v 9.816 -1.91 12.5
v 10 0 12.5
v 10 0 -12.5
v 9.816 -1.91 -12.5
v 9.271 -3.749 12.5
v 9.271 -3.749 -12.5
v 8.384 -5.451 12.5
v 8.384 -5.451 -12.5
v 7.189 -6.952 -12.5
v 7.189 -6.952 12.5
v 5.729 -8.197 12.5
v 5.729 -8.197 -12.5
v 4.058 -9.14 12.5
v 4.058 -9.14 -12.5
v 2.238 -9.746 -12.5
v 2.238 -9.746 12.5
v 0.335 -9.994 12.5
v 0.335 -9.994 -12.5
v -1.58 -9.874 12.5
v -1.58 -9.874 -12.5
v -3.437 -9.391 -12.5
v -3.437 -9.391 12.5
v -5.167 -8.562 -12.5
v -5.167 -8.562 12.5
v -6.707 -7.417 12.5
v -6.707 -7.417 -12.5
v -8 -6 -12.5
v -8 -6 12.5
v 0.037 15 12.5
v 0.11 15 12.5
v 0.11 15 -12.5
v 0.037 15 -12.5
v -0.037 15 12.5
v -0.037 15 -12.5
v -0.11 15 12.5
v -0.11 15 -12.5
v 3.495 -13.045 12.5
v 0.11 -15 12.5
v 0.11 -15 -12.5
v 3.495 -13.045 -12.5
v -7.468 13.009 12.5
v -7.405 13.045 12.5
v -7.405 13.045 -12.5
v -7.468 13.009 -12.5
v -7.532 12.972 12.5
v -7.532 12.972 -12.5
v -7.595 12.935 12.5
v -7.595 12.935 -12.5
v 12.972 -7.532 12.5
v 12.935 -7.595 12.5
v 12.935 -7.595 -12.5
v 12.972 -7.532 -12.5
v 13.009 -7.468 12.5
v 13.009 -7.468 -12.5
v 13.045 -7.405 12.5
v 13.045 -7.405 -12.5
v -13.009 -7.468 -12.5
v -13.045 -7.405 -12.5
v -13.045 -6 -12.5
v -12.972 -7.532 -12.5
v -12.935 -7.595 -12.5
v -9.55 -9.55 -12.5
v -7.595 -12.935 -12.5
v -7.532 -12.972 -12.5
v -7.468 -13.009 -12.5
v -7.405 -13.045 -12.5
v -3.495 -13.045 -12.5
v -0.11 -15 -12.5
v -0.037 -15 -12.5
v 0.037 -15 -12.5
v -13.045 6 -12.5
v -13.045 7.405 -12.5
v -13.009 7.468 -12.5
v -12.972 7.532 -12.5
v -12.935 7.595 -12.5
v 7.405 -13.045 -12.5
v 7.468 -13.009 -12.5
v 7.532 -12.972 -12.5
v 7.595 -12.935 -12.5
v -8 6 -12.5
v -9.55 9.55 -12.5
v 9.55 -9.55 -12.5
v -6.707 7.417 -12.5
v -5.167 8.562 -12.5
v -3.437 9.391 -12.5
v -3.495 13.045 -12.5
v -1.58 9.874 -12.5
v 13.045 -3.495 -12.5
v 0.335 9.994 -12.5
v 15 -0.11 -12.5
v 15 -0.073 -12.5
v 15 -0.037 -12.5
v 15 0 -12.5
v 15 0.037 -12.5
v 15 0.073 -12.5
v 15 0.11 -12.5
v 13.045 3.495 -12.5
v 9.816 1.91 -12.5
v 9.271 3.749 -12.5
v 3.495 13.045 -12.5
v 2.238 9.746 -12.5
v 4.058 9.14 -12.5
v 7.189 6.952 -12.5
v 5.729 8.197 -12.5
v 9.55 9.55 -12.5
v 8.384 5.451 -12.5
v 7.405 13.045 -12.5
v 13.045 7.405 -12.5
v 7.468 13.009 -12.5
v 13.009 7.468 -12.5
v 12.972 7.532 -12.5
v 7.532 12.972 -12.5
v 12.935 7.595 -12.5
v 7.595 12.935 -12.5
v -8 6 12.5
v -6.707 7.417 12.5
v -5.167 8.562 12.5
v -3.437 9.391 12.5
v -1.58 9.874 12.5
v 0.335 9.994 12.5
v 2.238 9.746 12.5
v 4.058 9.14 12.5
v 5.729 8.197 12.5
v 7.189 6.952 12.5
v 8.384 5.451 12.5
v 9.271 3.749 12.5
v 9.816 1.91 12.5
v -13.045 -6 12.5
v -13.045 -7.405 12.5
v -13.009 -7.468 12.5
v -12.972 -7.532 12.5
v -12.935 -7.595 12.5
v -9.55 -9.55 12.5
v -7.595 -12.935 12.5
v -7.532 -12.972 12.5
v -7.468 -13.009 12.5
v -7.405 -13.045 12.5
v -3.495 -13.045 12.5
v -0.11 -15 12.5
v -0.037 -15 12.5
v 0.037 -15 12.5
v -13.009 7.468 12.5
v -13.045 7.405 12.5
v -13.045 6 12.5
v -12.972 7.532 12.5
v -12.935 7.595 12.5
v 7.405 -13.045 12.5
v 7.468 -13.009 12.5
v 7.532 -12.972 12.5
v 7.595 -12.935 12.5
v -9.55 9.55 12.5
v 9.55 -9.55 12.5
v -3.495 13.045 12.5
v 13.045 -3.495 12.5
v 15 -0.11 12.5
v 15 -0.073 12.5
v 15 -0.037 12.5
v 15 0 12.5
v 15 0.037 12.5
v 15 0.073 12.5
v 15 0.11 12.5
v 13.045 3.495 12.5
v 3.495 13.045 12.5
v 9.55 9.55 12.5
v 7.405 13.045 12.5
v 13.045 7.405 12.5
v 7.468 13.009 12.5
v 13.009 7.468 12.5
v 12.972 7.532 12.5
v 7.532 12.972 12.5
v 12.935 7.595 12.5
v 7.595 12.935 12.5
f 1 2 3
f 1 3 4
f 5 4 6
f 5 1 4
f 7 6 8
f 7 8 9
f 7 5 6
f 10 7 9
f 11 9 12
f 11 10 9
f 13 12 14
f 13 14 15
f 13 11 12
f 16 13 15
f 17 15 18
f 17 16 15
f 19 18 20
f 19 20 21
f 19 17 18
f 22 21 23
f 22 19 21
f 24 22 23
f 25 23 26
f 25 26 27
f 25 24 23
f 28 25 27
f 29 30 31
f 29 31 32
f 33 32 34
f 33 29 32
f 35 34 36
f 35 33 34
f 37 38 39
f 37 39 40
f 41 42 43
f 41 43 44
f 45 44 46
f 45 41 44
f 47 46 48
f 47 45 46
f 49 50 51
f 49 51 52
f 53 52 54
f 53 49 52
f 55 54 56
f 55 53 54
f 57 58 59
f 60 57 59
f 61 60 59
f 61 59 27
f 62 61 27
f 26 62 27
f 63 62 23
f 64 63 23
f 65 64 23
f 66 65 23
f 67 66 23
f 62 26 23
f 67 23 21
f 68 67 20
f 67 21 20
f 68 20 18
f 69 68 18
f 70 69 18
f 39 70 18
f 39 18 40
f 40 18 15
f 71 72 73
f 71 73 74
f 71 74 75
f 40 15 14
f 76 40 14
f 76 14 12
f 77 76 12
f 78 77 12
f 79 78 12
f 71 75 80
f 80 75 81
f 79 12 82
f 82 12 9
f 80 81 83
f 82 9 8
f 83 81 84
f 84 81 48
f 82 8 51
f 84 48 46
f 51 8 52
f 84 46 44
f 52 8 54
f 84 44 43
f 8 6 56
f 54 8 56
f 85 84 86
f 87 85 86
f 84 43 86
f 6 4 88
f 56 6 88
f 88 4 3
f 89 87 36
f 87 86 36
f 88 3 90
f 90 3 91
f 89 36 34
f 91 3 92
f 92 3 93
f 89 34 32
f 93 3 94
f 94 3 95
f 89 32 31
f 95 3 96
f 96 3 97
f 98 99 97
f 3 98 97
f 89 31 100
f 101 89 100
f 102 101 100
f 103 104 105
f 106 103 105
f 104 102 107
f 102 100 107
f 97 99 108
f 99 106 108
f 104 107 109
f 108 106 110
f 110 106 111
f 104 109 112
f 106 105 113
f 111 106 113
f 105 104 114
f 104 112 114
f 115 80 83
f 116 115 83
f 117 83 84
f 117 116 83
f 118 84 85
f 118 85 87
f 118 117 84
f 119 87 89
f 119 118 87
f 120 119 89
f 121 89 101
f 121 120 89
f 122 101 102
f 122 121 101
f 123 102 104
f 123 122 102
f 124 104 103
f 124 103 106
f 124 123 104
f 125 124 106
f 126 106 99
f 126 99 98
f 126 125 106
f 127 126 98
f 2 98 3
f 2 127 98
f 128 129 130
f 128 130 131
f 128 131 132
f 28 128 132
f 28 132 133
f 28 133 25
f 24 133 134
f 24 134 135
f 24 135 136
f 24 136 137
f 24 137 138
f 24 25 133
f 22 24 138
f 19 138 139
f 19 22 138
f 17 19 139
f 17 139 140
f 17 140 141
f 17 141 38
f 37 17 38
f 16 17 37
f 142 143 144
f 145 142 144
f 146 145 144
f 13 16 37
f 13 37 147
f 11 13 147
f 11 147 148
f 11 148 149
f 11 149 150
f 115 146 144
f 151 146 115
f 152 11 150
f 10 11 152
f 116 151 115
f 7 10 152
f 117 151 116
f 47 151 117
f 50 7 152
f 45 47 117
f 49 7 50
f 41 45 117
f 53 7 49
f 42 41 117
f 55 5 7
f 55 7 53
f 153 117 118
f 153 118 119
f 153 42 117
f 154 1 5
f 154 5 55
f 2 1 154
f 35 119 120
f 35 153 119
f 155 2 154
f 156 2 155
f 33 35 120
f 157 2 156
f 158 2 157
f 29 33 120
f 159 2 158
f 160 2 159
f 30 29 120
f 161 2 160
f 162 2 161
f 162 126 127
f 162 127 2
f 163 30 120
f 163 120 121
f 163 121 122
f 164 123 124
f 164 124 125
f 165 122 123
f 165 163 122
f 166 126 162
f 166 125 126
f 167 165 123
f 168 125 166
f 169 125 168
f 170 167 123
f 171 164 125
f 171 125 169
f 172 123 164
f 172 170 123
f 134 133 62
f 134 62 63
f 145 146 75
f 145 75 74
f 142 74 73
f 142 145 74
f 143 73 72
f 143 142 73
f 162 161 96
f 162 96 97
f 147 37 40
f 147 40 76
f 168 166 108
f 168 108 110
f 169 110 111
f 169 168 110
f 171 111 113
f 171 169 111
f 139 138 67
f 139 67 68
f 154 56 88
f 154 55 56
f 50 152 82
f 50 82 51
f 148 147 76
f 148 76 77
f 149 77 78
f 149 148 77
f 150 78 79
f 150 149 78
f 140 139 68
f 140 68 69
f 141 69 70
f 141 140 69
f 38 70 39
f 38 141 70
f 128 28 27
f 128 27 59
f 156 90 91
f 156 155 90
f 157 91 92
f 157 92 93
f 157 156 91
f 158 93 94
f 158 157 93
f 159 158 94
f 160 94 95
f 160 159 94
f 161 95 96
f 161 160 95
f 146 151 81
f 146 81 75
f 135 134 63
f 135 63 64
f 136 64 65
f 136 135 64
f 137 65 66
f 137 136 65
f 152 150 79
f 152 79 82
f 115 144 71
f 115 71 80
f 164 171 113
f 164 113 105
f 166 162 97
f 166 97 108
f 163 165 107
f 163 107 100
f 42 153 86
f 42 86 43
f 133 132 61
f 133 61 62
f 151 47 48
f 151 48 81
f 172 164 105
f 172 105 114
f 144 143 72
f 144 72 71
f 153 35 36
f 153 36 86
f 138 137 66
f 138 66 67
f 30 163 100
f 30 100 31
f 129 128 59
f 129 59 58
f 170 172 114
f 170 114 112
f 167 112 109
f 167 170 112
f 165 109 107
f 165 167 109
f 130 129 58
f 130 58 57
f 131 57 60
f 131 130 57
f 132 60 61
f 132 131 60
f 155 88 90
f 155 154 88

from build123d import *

# Parameters (mm, degrees)
F1_DEPTH = 12.5


# Not quite as in the source:
# - ends of sketch curves that miss each other by under 0.0002 mm in the source are joined


with BuildPart() as f1:
    # F0 (on Top) → F1 (new body, symmetric)
    with BuildSketch(Plane.XY):
        with BuildLine():
            ThreePointArc((14.9995966273, -0.1100046231), (14.9998991565, -0.0550026813), (15, 0))
            ThreePointArc((15, 0), (14.9998991565, 0.0550026813), (14.9995966273, 0.1100046231))
            Line((14.9995966273, 0.1100046231), (13.0450340373, 3.4954063355))
            Line((13.0450340373, 3.4954063355), (13.0450340373, 7.4045315155))
            ThreePointArc((13.0450340373, 7.4045315155), (12.9903810568, 7.5), (12.9350294143, 7.5950651118))
            Line((12.9350294143, 7.5950651118), (9.5496277018, 9.5496277018))
            Line((9.5496277018, 9.5496277018), (7.5950651118, 12.9350294143))
            ThreePointArc((7.5950651118, 12.9350294143), (7.5, 12.9903810568), (7.4045315155, 13.0450340373))
            Line((7.4045315155, 13.0450340373), (3.4954063355, 13.0450340373))
            Line((3.4954063355, 13.0450340373), (0.1100046231, 14.9995966273))
            ThreePointArc((0.1100046231, 14.9995966273), (0, 15), (-0.1100046231, 14.9995966273))
            Line((-0.1100046231, 14.9995966273), (-3.4954063355, 13.0450340373))
            Line((-3.4954063355, 13.0450340373), (-7.4045315155, 13.0450340373))
            ThreePointArc((-7.4045315155, 13.0450340373), (-7.5, 12.9903810568), (-7.5950651118, 12.9350294143))
            Line((-7.5950651118, 12.9350294143), (-9.5496277018, 9.5496277018))
            Line((-9.5496277018, 9.5496277018), (-12.9350294143, 7.5950651118))
            ThreePointArc((-12.9350294143, 7.5950651118), (-12.9903810568, 7.5), (-13.0450340373, 7.4045315155))
            Line((-13.0450340373, 7.4045315155), (-13.0450340373, 6))
            Line((-13.0450340373, 6), (-8, 6))
            ThreePointArc((-8, 6), (3.1622775895, 9.4868327685), (9.9999997765, 0))
            ThreePointArc((9.9999997765, 0), (3.1622775895, -9.4868327685), (-7.9999998212, -5.9999998659))
            Line((-7.9999998212, -5.9999998659), (-13.0450340373, -6))
            Line((-13.0450340373, -6), (-13.0450340373, -7.4045315155))
            ThreePointArc((-13.0450340373, -7.4045315155), (-12.9903810568, -7.5), (-12.9350294143, -7.5950651118))
            Line((-12.9350294143, -7.5950651118), (-9.5496277018, -9.5496277018))
            Line((-9.5496277018, -9.5496277018), (-7.5950651118, -12.9350294143))
            ThreePointArc((-7.5950651118, -12.9350294143), (-7.5, -12.9903810568), (-7.4045315155, -13.0450340373))
            Line((-7.4045315155, -13.0450340373), (-3.4954063355, -13.0450340373))
            Line((-3.4954063355, -13.0450340373), (-0.1100046231, -14.9995966273))
            ThreePointArc((-0.1100046231, -14.9995966273), (0, -15), (0.1100046231, -14.9995966273))
            Line((0.1100046231, -14.9995966273), (3.4954063355, -13.0450340373))
            Line((3.4954063355, -13.0450340373), (7.4045315155, -13.0450340373))
            ThreePointArc((7.4045315155, -13.0450340373), (7.5, -12.9903810568), (7.5950651118, -12.9350294143))
            Line((7.5950651118, -12.9350294143), (9.5496277018, -9.5496277018))
            Line((9.5496277018, -9.5496277018), (12.9350294143, -7.5950651118))
            ThreePointArc((12.9350294143, -7.5950651118), (12.9903810568, -7.5), (13.0450340373, -7.4045315155))
            Line((13.0450340373, -7.4045315155), (13.0450340373, -3.4954063355))
            Line((13.0450340373, -3.4954063355), (14.9995966273, -0.1100046231))
        make_face()
    extrude(amount=F1_DEPTH, both=True)


solid = f1.part
